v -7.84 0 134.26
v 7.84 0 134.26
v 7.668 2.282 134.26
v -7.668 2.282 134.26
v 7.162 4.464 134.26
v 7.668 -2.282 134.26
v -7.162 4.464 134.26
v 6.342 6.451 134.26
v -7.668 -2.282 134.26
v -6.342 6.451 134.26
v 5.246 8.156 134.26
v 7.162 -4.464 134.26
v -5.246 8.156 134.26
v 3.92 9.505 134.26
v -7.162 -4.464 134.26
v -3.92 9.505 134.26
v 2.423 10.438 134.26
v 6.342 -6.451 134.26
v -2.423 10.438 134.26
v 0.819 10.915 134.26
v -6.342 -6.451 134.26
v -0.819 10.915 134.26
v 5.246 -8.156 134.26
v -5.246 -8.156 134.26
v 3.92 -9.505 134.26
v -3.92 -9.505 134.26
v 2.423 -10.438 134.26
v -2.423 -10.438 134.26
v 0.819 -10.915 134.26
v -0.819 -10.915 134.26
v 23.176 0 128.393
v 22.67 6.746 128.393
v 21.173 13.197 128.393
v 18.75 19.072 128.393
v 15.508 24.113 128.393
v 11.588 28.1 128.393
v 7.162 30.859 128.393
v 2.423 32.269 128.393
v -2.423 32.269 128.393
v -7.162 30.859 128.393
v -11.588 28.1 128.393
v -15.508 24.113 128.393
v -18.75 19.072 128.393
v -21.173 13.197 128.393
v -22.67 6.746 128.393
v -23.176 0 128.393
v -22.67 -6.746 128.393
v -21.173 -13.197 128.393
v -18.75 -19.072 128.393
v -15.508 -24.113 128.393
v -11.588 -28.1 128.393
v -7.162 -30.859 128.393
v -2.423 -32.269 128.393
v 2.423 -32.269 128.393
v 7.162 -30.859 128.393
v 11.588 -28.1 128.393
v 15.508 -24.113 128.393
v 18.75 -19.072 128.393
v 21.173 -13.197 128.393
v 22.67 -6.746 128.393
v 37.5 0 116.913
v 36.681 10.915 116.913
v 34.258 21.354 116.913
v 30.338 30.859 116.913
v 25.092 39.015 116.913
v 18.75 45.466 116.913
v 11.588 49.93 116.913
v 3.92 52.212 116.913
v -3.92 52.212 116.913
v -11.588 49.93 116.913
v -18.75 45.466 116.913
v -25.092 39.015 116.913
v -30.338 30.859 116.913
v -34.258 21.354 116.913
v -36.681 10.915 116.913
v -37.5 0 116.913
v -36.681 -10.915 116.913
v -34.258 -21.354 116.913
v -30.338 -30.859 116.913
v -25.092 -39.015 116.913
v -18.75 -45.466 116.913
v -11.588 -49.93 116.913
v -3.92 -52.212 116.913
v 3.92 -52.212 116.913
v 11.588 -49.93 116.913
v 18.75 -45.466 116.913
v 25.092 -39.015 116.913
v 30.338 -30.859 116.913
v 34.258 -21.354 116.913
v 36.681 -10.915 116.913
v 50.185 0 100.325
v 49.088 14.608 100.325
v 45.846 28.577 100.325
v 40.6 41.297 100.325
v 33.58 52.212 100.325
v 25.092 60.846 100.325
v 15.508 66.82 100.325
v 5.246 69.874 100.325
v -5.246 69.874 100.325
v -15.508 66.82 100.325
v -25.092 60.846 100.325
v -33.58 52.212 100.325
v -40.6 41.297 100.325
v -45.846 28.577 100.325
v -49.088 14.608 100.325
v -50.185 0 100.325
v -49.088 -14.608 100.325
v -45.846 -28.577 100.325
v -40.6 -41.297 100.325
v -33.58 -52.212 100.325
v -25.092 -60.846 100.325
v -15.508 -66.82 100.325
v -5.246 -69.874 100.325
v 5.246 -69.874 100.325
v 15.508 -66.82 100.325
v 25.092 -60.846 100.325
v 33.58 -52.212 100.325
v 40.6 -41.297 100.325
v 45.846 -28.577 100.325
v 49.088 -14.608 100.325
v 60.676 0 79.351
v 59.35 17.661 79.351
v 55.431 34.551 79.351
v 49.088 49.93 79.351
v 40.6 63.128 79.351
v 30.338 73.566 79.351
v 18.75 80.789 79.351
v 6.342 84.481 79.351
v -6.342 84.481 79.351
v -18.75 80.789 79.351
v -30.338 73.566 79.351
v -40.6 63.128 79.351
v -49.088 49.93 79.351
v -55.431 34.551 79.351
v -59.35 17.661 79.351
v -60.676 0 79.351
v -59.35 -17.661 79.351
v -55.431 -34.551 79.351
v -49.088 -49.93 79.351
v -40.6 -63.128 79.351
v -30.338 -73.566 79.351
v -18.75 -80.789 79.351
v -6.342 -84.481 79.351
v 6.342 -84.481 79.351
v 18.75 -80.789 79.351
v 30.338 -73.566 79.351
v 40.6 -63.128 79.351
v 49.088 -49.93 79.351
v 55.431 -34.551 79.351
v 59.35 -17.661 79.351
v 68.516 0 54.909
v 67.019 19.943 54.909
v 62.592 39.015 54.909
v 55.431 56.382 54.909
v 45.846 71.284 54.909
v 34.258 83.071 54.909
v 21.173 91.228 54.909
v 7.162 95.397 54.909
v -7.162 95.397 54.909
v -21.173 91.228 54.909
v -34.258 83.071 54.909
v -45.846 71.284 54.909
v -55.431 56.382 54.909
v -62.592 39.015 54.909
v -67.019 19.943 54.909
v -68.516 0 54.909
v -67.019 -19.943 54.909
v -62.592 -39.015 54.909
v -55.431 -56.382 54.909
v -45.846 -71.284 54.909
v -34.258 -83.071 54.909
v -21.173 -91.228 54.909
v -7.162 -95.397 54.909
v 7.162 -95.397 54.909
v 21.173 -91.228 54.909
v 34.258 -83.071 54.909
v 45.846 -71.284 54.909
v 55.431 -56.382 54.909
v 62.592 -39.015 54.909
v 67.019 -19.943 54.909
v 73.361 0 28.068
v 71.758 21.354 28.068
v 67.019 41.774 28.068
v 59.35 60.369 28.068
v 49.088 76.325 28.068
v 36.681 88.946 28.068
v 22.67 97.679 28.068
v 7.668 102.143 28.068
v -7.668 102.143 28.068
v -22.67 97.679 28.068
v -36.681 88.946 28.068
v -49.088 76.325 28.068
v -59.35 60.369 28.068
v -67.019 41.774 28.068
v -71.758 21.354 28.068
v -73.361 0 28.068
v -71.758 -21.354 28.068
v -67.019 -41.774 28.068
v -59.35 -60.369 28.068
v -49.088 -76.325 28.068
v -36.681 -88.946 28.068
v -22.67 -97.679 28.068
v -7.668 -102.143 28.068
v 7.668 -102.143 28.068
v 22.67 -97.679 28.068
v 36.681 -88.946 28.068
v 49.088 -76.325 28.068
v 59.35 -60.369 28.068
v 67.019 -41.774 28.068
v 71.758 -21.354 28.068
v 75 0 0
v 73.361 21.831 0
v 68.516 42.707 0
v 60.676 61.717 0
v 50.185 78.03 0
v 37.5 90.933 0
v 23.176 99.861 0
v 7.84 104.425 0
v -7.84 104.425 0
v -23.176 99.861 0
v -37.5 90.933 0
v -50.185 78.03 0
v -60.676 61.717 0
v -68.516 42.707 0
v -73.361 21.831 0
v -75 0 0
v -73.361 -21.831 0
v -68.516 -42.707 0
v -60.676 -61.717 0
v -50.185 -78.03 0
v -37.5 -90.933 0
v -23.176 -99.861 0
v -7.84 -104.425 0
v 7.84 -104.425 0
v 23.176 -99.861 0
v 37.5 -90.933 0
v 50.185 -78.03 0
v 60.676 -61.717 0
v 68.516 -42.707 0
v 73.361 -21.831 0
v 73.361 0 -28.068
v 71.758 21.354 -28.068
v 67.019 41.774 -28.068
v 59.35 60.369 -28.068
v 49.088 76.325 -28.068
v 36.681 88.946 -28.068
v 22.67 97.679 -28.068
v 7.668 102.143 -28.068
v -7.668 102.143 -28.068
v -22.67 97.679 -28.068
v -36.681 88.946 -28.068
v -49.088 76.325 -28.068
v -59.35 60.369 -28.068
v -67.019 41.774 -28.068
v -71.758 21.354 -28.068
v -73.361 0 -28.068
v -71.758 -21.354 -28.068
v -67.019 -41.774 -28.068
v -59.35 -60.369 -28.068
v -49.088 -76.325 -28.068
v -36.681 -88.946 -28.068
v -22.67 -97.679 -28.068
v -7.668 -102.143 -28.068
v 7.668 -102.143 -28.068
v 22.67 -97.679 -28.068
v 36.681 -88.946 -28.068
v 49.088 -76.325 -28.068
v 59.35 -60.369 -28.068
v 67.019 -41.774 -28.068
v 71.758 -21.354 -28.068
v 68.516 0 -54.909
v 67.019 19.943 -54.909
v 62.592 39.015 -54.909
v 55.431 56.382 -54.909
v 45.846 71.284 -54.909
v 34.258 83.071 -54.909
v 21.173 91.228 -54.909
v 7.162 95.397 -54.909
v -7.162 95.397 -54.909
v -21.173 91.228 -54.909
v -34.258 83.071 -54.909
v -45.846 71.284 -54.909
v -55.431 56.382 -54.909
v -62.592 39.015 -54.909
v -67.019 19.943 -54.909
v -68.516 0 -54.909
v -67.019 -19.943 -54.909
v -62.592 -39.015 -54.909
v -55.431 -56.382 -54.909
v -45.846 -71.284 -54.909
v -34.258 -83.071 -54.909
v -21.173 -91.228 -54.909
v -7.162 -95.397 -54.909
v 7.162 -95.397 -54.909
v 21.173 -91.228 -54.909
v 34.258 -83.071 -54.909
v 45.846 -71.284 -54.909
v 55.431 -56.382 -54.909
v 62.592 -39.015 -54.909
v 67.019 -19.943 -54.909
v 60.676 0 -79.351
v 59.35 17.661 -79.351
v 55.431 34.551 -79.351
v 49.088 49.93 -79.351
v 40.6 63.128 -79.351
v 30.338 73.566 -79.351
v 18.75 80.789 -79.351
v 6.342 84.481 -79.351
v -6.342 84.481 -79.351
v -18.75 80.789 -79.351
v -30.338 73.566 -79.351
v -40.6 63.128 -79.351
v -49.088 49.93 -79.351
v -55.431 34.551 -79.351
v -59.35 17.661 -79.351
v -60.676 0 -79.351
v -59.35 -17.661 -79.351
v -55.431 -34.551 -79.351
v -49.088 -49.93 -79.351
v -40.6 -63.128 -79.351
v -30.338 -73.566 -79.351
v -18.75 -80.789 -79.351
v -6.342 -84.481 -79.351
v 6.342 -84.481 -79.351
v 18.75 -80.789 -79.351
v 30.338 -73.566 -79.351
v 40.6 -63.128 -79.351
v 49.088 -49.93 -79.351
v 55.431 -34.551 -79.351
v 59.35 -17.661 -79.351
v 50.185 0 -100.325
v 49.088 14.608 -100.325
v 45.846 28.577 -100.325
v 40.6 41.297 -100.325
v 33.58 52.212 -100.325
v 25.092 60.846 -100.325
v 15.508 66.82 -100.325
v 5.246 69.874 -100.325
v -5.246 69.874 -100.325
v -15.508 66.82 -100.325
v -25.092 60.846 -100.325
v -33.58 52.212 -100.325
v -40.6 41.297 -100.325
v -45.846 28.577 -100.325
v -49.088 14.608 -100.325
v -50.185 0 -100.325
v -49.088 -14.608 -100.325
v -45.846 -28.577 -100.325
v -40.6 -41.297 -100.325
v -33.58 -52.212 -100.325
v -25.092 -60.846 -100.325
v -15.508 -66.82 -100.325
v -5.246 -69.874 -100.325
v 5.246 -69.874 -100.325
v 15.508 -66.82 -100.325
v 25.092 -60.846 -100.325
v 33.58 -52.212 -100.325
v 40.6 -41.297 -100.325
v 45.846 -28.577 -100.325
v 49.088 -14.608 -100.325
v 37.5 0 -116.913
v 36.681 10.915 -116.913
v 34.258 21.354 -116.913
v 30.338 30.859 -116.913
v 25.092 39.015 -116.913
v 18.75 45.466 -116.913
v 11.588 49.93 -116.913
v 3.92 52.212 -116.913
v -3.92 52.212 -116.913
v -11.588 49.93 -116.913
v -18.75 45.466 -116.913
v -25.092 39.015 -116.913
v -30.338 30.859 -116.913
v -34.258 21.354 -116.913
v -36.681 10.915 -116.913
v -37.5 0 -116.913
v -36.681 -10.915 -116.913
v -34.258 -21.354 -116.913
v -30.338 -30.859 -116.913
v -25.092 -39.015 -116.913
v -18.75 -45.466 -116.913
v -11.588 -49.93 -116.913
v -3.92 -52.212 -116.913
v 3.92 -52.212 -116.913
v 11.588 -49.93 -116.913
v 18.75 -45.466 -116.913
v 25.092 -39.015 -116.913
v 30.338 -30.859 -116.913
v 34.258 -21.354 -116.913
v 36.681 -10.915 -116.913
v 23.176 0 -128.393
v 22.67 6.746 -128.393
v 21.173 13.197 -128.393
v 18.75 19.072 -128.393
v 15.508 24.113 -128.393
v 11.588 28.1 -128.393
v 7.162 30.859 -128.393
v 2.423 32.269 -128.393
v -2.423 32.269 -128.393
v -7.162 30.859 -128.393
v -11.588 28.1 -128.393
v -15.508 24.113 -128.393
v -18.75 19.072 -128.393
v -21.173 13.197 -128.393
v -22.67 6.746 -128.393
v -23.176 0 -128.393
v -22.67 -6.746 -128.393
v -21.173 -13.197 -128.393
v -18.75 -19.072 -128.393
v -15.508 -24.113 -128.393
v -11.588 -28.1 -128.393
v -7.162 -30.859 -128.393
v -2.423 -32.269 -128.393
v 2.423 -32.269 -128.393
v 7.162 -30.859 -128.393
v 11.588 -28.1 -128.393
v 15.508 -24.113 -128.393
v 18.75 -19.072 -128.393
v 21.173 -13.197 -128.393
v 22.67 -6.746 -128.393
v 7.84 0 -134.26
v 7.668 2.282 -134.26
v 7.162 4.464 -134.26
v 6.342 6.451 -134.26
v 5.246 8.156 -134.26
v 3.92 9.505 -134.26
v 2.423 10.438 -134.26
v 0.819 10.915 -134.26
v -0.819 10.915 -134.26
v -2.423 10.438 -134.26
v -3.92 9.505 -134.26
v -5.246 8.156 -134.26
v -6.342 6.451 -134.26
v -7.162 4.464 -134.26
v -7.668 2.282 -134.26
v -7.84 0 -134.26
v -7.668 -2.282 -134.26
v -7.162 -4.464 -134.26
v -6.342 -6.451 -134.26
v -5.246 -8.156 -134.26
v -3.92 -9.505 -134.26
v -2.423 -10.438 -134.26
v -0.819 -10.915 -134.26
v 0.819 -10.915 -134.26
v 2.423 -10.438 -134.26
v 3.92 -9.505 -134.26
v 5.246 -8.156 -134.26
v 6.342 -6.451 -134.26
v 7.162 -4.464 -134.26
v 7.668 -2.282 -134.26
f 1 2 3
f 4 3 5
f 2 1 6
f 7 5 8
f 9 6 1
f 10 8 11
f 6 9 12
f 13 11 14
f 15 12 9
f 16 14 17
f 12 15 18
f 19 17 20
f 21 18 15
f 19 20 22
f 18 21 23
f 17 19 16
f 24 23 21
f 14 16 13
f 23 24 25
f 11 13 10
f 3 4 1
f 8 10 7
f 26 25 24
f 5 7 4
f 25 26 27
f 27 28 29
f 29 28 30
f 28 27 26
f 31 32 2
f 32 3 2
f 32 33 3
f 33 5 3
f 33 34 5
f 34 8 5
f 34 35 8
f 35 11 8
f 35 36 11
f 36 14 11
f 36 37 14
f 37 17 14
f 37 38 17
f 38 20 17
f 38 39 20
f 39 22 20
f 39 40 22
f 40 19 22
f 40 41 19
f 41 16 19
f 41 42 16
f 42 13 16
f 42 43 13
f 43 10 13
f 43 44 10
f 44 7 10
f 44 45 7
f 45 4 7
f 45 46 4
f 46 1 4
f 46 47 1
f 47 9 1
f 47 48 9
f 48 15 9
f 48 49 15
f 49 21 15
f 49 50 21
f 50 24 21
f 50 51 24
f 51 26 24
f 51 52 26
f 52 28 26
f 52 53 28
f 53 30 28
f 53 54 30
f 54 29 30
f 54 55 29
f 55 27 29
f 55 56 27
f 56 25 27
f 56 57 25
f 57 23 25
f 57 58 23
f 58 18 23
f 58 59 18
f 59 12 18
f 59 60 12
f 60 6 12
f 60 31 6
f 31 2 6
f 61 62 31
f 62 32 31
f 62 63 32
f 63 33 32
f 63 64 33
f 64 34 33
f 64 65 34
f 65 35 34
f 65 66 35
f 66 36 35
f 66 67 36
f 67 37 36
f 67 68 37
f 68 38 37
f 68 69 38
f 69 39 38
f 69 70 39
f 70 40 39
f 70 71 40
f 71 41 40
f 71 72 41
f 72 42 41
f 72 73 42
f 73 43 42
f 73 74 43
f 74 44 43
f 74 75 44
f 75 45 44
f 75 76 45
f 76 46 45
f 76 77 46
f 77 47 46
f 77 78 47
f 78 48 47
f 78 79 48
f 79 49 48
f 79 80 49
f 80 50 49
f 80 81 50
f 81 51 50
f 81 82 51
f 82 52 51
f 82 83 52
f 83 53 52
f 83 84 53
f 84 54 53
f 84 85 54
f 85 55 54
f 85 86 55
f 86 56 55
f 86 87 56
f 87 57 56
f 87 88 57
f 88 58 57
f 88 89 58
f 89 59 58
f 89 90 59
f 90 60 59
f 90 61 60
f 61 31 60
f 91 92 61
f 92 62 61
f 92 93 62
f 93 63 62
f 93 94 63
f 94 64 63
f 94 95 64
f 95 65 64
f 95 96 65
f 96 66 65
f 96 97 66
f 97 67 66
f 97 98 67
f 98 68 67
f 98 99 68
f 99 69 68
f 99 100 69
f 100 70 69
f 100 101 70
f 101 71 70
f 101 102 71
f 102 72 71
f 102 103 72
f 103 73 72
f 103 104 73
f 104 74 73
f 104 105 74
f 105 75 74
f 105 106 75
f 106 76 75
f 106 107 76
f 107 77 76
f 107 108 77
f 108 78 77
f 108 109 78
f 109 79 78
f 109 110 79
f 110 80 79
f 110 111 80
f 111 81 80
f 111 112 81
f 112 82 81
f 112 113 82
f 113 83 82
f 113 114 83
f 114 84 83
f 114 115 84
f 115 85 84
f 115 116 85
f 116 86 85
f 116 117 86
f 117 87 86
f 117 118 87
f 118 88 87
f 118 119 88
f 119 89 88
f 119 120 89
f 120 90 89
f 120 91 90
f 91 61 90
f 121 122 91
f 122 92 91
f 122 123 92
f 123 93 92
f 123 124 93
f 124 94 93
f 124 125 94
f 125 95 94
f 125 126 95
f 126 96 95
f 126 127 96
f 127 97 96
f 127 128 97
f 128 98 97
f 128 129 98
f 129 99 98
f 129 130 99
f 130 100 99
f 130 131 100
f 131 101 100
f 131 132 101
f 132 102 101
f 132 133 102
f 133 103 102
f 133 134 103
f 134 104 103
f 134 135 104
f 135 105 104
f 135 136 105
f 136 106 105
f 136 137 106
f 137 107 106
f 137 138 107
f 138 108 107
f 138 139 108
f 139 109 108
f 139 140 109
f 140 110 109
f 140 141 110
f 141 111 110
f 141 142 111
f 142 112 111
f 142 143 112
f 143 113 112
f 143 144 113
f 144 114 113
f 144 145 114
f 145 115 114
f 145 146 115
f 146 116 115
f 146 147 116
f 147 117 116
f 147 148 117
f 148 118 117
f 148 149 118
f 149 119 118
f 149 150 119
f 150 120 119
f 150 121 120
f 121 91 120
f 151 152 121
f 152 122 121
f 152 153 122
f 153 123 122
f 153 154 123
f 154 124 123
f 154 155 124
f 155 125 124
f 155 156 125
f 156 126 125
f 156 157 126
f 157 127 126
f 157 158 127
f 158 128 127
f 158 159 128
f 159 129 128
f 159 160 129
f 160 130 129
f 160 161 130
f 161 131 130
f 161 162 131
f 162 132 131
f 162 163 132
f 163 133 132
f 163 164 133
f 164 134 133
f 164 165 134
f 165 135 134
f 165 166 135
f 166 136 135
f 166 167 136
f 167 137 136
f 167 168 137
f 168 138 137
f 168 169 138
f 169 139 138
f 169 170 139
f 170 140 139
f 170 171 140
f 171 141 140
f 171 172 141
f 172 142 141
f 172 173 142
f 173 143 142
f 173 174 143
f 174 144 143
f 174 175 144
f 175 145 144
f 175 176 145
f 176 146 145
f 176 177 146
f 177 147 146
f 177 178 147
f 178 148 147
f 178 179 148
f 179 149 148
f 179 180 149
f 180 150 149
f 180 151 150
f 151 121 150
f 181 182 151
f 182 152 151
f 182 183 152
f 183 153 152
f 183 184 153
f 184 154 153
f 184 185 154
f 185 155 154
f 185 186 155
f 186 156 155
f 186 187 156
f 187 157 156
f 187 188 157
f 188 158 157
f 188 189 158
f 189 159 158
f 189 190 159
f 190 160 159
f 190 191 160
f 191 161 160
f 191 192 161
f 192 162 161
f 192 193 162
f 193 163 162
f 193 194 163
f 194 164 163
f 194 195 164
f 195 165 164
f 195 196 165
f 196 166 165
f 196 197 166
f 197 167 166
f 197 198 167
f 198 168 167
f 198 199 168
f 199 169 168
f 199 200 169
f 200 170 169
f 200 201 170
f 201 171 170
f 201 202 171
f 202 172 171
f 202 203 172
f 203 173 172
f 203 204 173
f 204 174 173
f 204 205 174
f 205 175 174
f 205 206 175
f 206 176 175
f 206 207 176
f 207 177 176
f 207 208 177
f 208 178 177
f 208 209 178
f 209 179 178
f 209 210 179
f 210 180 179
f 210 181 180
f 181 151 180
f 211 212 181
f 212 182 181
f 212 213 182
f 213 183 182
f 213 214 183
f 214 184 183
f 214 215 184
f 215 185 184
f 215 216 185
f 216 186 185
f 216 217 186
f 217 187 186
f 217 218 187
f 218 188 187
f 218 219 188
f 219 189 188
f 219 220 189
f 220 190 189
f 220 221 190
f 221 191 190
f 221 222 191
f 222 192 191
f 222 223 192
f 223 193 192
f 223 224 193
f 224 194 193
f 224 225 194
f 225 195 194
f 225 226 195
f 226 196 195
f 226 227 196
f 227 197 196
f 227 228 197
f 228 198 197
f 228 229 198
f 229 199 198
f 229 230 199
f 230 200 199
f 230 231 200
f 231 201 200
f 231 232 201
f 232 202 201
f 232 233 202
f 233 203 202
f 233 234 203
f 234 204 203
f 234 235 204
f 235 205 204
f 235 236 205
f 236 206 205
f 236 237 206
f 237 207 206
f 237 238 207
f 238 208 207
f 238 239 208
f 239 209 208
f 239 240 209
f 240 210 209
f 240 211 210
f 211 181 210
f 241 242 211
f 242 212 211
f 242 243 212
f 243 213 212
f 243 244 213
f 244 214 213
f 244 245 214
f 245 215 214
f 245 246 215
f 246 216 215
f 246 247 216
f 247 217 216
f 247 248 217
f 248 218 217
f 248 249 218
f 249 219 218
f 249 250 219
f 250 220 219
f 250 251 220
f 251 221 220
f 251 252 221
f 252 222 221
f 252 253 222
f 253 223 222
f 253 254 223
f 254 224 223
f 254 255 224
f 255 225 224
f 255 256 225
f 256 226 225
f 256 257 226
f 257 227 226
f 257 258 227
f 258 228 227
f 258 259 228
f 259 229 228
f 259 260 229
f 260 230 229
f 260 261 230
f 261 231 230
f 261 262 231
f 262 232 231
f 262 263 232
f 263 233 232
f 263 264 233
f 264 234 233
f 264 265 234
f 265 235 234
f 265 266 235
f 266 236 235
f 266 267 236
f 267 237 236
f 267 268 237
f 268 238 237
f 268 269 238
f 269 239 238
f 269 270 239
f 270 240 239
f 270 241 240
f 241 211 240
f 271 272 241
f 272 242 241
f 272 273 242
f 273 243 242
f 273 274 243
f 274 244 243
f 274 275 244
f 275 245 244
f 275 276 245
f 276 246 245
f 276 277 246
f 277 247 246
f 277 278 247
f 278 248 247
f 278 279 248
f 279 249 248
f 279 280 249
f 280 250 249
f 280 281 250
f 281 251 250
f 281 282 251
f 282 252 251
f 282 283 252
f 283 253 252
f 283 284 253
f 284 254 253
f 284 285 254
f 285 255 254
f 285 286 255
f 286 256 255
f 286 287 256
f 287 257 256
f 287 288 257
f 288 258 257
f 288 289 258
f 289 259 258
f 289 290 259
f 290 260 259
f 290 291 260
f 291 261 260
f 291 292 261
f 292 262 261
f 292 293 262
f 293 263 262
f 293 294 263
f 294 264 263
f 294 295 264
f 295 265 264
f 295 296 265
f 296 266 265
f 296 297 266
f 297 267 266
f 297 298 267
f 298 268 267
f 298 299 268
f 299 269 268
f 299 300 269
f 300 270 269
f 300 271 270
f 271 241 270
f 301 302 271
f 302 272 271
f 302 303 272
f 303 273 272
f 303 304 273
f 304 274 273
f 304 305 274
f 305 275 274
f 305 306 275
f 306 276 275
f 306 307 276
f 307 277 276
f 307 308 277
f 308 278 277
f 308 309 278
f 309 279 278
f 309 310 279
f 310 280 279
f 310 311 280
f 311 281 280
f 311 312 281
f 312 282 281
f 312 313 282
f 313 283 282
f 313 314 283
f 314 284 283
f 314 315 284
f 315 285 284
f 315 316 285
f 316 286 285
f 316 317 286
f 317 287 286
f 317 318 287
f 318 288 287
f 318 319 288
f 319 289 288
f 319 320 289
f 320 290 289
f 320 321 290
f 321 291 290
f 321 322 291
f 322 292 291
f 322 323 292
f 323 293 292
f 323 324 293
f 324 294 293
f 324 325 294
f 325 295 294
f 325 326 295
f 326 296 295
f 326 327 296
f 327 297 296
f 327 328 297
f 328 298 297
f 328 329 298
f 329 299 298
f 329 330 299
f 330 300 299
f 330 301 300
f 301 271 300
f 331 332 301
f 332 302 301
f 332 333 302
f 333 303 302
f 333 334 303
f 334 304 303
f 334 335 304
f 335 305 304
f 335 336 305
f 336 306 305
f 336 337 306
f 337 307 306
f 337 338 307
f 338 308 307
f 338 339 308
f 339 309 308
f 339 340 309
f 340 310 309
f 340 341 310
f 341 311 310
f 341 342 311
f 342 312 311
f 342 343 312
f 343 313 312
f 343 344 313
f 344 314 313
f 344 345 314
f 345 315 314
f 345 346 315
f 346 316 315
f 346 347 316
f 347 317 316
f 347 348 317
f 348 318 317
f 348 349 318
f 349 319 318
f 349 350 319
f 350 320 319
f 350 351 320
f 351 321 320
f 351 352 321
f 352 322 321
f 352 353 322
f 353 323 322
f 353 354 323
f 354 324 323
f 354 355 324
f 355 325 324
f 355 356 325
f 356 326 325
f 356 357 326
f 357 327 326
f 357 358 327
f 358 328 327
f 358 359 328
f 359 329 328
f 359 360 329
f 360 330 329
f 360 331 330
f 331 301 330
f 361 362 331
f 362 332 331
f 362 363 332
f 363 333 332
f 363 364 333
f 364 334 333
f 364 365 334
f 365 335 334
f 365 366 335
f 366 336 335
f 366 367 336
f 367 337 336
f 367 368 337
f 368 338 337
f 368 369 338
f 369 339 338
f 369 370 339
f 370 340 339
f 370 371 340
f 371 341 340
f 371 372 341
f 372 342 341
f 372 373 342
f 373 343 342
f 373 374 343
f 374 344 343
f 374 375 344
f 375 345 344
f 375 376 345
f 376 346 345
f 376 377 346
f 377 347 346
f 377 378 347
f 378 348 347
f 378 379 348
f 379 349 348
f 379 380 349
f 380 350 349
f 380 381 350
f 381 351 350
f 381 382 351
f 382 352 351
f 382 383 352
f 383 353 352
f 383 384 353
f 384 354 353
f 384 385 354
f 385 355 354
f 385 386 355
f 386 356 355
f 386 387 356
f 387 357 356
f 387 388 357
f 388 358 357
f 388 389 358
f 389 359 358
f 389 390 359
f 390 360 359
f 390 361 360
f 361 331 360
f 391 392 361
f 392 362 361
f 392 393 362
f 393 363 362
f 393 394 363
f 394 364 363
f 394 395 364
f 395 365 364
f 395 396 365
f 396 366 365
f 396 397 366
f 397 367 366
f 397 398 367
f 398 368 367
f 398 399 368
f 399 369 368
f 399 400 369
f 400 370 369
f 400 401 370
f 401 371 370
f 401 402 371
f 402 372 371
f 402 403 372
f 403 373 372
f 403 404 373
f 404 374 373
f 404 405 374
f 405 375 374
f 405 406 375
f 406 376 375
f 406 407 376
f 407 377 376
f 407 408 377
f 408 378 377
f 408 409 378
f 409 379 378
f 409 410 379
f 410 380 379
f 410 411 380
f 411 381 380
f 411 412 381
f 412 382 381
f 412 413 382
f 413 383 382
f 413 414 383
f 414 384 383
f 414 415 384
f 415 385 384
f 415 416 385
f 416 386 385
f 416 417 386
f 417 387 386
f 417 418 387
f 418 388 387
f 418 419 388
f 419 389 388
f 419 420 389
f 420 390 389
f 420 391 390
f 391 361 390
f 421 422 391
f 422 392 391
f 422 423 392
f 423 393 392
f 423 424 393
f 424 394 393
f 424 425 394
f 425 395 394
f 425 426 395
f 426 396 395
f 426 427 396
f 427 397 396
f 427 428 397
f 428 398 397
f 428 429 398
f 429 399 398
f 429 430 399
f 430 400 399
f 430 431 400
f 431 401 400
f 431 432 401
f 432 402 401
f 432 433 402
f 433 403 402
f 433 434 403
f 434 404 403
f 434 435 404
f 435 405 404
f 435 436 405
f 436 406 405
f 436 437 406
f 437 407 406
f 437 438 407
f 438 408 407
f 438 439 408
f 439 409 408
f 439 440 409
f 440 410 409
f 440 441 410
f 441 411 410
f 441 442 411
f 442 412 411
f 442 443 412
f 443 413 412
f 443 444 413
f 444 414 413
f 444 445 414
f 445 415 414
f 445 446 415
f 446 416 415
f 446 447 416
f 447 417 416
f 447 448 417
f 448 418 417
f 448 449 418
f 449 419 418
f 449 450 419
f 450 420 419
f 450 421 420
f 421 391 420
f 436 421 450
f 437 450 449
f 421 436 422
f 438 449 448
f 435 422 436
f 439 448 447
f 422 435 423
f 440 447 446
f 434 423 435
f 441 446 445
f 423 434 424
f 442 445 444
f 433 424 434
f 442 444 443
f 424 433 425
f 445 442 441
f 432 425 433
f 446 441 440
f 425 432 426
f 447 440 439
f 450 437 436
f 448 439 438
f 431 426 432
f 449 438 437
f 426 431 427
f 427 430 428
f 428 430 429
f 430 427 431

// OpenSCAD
// Generated by SolidPython 1.0.1 on 2020-07-29 00:39:26


scale(v = [5, 7, 9]) {
	sphere(r = 15);
}
/***********************************************
*********      SolidPython code:      **********
************************************************
 
# import packages: SolidPython
from solid import *
from solid.utils import *
from itertools import chain, combinations


class Resize:

    def __init__(self, scad_file):
        self.scad_file = scad_file
        #self.scad_file = import_scad(scad_file)
        # cone/cylinder param:
        self.r1 = 0
        self.r2 = 0
        self.h = 0
        # rectangular prism param:
        self.w = 0
        self.l = 0
        # ellipse param:
        self.r = 0

    # import OpenScad code (file name corresponds to shape)


    # classify shape + parameters
    def assign(self, param1, param2, param3):
        if self.scad_file == 'cone.scad':
            self.r1 = param1
            self.r2 = param2
            self.h = param3
        elif self.scad_file == 'cylinder.scad':
            self.r1 = param1
            self.r2 = param2
            self.h = param3
        elif self.scad_file == 'rectangularPrism.scad':
            self.h = param1
            self.l = param2
            self.w = param3
        else:
            self.r = param1
            self.h = param2

    # resize parameters
    def iterate(self):
        x = range(3, 20, 2)
        i = 1
        if self.scad_file == 'cone.scad':
            tempList = list(combinations(x, 2))
            for temp in tempList:
                param1 = temp[0]
                param2 = temp[1]
                filepath = 'produced_scad_files/' + 'cone' + str(param1) + '_' + str(param2) + '_' + '.scad'
                scad_render_to_file(cylinder(h=param1, r1=param2, r2=0), filepath)

        elif self.scad_file == 'cylinder.scad':
            tempList = list(combinations(x, 3))
            for temp in tempList:
                param1 = temp[0]
                param2 = temp[1]
                filepath = 'produced_scad_files/' + 'cylinder' + str(param1) + '_' + str(param2) + '_' + '.scad'
                scad_render_to_file(cylinder(h=param1, r1=param2, r2=param2), filepath)

        elif self.scad_file == 'rectangularPrism.scad':
            tempList = list(combinations(x, 3))
            for temp in tempList:
                param1 = temp[0]
                param2 = temp[1]
                param3 = temp[2]
                filepath = 'produced_scad_files/' + 'rectangularPrism' + str(param1) + '_' + str(param2) + '_' + str(
                    param3) + '.scad'
                scad_render_to_file(cube(size=(param1, param2, param3)), filepath)

        elif self.scad_file == 'ellipse.scad':
            tempList = list(combinations(x, 4))
            for temp in tempList:
                param1 = temp[0]
                param2 = temp[1]
                param3 = temp[2]
                param4 = temp[3]
                filepath = 'produced_scad_files/' + 'ellipse' + str(param1) + '_' + str(param2) + '_' + str(param3) + '_' + str(param4) + '.scad'
                scad_render_to_file(scale([param1, param2, param3])(sphere(r=param4)), filepath)

    def render_to_scadfile(self):
        scad_render_to_file(scad, 'example.scad') 
 
************************************************/
